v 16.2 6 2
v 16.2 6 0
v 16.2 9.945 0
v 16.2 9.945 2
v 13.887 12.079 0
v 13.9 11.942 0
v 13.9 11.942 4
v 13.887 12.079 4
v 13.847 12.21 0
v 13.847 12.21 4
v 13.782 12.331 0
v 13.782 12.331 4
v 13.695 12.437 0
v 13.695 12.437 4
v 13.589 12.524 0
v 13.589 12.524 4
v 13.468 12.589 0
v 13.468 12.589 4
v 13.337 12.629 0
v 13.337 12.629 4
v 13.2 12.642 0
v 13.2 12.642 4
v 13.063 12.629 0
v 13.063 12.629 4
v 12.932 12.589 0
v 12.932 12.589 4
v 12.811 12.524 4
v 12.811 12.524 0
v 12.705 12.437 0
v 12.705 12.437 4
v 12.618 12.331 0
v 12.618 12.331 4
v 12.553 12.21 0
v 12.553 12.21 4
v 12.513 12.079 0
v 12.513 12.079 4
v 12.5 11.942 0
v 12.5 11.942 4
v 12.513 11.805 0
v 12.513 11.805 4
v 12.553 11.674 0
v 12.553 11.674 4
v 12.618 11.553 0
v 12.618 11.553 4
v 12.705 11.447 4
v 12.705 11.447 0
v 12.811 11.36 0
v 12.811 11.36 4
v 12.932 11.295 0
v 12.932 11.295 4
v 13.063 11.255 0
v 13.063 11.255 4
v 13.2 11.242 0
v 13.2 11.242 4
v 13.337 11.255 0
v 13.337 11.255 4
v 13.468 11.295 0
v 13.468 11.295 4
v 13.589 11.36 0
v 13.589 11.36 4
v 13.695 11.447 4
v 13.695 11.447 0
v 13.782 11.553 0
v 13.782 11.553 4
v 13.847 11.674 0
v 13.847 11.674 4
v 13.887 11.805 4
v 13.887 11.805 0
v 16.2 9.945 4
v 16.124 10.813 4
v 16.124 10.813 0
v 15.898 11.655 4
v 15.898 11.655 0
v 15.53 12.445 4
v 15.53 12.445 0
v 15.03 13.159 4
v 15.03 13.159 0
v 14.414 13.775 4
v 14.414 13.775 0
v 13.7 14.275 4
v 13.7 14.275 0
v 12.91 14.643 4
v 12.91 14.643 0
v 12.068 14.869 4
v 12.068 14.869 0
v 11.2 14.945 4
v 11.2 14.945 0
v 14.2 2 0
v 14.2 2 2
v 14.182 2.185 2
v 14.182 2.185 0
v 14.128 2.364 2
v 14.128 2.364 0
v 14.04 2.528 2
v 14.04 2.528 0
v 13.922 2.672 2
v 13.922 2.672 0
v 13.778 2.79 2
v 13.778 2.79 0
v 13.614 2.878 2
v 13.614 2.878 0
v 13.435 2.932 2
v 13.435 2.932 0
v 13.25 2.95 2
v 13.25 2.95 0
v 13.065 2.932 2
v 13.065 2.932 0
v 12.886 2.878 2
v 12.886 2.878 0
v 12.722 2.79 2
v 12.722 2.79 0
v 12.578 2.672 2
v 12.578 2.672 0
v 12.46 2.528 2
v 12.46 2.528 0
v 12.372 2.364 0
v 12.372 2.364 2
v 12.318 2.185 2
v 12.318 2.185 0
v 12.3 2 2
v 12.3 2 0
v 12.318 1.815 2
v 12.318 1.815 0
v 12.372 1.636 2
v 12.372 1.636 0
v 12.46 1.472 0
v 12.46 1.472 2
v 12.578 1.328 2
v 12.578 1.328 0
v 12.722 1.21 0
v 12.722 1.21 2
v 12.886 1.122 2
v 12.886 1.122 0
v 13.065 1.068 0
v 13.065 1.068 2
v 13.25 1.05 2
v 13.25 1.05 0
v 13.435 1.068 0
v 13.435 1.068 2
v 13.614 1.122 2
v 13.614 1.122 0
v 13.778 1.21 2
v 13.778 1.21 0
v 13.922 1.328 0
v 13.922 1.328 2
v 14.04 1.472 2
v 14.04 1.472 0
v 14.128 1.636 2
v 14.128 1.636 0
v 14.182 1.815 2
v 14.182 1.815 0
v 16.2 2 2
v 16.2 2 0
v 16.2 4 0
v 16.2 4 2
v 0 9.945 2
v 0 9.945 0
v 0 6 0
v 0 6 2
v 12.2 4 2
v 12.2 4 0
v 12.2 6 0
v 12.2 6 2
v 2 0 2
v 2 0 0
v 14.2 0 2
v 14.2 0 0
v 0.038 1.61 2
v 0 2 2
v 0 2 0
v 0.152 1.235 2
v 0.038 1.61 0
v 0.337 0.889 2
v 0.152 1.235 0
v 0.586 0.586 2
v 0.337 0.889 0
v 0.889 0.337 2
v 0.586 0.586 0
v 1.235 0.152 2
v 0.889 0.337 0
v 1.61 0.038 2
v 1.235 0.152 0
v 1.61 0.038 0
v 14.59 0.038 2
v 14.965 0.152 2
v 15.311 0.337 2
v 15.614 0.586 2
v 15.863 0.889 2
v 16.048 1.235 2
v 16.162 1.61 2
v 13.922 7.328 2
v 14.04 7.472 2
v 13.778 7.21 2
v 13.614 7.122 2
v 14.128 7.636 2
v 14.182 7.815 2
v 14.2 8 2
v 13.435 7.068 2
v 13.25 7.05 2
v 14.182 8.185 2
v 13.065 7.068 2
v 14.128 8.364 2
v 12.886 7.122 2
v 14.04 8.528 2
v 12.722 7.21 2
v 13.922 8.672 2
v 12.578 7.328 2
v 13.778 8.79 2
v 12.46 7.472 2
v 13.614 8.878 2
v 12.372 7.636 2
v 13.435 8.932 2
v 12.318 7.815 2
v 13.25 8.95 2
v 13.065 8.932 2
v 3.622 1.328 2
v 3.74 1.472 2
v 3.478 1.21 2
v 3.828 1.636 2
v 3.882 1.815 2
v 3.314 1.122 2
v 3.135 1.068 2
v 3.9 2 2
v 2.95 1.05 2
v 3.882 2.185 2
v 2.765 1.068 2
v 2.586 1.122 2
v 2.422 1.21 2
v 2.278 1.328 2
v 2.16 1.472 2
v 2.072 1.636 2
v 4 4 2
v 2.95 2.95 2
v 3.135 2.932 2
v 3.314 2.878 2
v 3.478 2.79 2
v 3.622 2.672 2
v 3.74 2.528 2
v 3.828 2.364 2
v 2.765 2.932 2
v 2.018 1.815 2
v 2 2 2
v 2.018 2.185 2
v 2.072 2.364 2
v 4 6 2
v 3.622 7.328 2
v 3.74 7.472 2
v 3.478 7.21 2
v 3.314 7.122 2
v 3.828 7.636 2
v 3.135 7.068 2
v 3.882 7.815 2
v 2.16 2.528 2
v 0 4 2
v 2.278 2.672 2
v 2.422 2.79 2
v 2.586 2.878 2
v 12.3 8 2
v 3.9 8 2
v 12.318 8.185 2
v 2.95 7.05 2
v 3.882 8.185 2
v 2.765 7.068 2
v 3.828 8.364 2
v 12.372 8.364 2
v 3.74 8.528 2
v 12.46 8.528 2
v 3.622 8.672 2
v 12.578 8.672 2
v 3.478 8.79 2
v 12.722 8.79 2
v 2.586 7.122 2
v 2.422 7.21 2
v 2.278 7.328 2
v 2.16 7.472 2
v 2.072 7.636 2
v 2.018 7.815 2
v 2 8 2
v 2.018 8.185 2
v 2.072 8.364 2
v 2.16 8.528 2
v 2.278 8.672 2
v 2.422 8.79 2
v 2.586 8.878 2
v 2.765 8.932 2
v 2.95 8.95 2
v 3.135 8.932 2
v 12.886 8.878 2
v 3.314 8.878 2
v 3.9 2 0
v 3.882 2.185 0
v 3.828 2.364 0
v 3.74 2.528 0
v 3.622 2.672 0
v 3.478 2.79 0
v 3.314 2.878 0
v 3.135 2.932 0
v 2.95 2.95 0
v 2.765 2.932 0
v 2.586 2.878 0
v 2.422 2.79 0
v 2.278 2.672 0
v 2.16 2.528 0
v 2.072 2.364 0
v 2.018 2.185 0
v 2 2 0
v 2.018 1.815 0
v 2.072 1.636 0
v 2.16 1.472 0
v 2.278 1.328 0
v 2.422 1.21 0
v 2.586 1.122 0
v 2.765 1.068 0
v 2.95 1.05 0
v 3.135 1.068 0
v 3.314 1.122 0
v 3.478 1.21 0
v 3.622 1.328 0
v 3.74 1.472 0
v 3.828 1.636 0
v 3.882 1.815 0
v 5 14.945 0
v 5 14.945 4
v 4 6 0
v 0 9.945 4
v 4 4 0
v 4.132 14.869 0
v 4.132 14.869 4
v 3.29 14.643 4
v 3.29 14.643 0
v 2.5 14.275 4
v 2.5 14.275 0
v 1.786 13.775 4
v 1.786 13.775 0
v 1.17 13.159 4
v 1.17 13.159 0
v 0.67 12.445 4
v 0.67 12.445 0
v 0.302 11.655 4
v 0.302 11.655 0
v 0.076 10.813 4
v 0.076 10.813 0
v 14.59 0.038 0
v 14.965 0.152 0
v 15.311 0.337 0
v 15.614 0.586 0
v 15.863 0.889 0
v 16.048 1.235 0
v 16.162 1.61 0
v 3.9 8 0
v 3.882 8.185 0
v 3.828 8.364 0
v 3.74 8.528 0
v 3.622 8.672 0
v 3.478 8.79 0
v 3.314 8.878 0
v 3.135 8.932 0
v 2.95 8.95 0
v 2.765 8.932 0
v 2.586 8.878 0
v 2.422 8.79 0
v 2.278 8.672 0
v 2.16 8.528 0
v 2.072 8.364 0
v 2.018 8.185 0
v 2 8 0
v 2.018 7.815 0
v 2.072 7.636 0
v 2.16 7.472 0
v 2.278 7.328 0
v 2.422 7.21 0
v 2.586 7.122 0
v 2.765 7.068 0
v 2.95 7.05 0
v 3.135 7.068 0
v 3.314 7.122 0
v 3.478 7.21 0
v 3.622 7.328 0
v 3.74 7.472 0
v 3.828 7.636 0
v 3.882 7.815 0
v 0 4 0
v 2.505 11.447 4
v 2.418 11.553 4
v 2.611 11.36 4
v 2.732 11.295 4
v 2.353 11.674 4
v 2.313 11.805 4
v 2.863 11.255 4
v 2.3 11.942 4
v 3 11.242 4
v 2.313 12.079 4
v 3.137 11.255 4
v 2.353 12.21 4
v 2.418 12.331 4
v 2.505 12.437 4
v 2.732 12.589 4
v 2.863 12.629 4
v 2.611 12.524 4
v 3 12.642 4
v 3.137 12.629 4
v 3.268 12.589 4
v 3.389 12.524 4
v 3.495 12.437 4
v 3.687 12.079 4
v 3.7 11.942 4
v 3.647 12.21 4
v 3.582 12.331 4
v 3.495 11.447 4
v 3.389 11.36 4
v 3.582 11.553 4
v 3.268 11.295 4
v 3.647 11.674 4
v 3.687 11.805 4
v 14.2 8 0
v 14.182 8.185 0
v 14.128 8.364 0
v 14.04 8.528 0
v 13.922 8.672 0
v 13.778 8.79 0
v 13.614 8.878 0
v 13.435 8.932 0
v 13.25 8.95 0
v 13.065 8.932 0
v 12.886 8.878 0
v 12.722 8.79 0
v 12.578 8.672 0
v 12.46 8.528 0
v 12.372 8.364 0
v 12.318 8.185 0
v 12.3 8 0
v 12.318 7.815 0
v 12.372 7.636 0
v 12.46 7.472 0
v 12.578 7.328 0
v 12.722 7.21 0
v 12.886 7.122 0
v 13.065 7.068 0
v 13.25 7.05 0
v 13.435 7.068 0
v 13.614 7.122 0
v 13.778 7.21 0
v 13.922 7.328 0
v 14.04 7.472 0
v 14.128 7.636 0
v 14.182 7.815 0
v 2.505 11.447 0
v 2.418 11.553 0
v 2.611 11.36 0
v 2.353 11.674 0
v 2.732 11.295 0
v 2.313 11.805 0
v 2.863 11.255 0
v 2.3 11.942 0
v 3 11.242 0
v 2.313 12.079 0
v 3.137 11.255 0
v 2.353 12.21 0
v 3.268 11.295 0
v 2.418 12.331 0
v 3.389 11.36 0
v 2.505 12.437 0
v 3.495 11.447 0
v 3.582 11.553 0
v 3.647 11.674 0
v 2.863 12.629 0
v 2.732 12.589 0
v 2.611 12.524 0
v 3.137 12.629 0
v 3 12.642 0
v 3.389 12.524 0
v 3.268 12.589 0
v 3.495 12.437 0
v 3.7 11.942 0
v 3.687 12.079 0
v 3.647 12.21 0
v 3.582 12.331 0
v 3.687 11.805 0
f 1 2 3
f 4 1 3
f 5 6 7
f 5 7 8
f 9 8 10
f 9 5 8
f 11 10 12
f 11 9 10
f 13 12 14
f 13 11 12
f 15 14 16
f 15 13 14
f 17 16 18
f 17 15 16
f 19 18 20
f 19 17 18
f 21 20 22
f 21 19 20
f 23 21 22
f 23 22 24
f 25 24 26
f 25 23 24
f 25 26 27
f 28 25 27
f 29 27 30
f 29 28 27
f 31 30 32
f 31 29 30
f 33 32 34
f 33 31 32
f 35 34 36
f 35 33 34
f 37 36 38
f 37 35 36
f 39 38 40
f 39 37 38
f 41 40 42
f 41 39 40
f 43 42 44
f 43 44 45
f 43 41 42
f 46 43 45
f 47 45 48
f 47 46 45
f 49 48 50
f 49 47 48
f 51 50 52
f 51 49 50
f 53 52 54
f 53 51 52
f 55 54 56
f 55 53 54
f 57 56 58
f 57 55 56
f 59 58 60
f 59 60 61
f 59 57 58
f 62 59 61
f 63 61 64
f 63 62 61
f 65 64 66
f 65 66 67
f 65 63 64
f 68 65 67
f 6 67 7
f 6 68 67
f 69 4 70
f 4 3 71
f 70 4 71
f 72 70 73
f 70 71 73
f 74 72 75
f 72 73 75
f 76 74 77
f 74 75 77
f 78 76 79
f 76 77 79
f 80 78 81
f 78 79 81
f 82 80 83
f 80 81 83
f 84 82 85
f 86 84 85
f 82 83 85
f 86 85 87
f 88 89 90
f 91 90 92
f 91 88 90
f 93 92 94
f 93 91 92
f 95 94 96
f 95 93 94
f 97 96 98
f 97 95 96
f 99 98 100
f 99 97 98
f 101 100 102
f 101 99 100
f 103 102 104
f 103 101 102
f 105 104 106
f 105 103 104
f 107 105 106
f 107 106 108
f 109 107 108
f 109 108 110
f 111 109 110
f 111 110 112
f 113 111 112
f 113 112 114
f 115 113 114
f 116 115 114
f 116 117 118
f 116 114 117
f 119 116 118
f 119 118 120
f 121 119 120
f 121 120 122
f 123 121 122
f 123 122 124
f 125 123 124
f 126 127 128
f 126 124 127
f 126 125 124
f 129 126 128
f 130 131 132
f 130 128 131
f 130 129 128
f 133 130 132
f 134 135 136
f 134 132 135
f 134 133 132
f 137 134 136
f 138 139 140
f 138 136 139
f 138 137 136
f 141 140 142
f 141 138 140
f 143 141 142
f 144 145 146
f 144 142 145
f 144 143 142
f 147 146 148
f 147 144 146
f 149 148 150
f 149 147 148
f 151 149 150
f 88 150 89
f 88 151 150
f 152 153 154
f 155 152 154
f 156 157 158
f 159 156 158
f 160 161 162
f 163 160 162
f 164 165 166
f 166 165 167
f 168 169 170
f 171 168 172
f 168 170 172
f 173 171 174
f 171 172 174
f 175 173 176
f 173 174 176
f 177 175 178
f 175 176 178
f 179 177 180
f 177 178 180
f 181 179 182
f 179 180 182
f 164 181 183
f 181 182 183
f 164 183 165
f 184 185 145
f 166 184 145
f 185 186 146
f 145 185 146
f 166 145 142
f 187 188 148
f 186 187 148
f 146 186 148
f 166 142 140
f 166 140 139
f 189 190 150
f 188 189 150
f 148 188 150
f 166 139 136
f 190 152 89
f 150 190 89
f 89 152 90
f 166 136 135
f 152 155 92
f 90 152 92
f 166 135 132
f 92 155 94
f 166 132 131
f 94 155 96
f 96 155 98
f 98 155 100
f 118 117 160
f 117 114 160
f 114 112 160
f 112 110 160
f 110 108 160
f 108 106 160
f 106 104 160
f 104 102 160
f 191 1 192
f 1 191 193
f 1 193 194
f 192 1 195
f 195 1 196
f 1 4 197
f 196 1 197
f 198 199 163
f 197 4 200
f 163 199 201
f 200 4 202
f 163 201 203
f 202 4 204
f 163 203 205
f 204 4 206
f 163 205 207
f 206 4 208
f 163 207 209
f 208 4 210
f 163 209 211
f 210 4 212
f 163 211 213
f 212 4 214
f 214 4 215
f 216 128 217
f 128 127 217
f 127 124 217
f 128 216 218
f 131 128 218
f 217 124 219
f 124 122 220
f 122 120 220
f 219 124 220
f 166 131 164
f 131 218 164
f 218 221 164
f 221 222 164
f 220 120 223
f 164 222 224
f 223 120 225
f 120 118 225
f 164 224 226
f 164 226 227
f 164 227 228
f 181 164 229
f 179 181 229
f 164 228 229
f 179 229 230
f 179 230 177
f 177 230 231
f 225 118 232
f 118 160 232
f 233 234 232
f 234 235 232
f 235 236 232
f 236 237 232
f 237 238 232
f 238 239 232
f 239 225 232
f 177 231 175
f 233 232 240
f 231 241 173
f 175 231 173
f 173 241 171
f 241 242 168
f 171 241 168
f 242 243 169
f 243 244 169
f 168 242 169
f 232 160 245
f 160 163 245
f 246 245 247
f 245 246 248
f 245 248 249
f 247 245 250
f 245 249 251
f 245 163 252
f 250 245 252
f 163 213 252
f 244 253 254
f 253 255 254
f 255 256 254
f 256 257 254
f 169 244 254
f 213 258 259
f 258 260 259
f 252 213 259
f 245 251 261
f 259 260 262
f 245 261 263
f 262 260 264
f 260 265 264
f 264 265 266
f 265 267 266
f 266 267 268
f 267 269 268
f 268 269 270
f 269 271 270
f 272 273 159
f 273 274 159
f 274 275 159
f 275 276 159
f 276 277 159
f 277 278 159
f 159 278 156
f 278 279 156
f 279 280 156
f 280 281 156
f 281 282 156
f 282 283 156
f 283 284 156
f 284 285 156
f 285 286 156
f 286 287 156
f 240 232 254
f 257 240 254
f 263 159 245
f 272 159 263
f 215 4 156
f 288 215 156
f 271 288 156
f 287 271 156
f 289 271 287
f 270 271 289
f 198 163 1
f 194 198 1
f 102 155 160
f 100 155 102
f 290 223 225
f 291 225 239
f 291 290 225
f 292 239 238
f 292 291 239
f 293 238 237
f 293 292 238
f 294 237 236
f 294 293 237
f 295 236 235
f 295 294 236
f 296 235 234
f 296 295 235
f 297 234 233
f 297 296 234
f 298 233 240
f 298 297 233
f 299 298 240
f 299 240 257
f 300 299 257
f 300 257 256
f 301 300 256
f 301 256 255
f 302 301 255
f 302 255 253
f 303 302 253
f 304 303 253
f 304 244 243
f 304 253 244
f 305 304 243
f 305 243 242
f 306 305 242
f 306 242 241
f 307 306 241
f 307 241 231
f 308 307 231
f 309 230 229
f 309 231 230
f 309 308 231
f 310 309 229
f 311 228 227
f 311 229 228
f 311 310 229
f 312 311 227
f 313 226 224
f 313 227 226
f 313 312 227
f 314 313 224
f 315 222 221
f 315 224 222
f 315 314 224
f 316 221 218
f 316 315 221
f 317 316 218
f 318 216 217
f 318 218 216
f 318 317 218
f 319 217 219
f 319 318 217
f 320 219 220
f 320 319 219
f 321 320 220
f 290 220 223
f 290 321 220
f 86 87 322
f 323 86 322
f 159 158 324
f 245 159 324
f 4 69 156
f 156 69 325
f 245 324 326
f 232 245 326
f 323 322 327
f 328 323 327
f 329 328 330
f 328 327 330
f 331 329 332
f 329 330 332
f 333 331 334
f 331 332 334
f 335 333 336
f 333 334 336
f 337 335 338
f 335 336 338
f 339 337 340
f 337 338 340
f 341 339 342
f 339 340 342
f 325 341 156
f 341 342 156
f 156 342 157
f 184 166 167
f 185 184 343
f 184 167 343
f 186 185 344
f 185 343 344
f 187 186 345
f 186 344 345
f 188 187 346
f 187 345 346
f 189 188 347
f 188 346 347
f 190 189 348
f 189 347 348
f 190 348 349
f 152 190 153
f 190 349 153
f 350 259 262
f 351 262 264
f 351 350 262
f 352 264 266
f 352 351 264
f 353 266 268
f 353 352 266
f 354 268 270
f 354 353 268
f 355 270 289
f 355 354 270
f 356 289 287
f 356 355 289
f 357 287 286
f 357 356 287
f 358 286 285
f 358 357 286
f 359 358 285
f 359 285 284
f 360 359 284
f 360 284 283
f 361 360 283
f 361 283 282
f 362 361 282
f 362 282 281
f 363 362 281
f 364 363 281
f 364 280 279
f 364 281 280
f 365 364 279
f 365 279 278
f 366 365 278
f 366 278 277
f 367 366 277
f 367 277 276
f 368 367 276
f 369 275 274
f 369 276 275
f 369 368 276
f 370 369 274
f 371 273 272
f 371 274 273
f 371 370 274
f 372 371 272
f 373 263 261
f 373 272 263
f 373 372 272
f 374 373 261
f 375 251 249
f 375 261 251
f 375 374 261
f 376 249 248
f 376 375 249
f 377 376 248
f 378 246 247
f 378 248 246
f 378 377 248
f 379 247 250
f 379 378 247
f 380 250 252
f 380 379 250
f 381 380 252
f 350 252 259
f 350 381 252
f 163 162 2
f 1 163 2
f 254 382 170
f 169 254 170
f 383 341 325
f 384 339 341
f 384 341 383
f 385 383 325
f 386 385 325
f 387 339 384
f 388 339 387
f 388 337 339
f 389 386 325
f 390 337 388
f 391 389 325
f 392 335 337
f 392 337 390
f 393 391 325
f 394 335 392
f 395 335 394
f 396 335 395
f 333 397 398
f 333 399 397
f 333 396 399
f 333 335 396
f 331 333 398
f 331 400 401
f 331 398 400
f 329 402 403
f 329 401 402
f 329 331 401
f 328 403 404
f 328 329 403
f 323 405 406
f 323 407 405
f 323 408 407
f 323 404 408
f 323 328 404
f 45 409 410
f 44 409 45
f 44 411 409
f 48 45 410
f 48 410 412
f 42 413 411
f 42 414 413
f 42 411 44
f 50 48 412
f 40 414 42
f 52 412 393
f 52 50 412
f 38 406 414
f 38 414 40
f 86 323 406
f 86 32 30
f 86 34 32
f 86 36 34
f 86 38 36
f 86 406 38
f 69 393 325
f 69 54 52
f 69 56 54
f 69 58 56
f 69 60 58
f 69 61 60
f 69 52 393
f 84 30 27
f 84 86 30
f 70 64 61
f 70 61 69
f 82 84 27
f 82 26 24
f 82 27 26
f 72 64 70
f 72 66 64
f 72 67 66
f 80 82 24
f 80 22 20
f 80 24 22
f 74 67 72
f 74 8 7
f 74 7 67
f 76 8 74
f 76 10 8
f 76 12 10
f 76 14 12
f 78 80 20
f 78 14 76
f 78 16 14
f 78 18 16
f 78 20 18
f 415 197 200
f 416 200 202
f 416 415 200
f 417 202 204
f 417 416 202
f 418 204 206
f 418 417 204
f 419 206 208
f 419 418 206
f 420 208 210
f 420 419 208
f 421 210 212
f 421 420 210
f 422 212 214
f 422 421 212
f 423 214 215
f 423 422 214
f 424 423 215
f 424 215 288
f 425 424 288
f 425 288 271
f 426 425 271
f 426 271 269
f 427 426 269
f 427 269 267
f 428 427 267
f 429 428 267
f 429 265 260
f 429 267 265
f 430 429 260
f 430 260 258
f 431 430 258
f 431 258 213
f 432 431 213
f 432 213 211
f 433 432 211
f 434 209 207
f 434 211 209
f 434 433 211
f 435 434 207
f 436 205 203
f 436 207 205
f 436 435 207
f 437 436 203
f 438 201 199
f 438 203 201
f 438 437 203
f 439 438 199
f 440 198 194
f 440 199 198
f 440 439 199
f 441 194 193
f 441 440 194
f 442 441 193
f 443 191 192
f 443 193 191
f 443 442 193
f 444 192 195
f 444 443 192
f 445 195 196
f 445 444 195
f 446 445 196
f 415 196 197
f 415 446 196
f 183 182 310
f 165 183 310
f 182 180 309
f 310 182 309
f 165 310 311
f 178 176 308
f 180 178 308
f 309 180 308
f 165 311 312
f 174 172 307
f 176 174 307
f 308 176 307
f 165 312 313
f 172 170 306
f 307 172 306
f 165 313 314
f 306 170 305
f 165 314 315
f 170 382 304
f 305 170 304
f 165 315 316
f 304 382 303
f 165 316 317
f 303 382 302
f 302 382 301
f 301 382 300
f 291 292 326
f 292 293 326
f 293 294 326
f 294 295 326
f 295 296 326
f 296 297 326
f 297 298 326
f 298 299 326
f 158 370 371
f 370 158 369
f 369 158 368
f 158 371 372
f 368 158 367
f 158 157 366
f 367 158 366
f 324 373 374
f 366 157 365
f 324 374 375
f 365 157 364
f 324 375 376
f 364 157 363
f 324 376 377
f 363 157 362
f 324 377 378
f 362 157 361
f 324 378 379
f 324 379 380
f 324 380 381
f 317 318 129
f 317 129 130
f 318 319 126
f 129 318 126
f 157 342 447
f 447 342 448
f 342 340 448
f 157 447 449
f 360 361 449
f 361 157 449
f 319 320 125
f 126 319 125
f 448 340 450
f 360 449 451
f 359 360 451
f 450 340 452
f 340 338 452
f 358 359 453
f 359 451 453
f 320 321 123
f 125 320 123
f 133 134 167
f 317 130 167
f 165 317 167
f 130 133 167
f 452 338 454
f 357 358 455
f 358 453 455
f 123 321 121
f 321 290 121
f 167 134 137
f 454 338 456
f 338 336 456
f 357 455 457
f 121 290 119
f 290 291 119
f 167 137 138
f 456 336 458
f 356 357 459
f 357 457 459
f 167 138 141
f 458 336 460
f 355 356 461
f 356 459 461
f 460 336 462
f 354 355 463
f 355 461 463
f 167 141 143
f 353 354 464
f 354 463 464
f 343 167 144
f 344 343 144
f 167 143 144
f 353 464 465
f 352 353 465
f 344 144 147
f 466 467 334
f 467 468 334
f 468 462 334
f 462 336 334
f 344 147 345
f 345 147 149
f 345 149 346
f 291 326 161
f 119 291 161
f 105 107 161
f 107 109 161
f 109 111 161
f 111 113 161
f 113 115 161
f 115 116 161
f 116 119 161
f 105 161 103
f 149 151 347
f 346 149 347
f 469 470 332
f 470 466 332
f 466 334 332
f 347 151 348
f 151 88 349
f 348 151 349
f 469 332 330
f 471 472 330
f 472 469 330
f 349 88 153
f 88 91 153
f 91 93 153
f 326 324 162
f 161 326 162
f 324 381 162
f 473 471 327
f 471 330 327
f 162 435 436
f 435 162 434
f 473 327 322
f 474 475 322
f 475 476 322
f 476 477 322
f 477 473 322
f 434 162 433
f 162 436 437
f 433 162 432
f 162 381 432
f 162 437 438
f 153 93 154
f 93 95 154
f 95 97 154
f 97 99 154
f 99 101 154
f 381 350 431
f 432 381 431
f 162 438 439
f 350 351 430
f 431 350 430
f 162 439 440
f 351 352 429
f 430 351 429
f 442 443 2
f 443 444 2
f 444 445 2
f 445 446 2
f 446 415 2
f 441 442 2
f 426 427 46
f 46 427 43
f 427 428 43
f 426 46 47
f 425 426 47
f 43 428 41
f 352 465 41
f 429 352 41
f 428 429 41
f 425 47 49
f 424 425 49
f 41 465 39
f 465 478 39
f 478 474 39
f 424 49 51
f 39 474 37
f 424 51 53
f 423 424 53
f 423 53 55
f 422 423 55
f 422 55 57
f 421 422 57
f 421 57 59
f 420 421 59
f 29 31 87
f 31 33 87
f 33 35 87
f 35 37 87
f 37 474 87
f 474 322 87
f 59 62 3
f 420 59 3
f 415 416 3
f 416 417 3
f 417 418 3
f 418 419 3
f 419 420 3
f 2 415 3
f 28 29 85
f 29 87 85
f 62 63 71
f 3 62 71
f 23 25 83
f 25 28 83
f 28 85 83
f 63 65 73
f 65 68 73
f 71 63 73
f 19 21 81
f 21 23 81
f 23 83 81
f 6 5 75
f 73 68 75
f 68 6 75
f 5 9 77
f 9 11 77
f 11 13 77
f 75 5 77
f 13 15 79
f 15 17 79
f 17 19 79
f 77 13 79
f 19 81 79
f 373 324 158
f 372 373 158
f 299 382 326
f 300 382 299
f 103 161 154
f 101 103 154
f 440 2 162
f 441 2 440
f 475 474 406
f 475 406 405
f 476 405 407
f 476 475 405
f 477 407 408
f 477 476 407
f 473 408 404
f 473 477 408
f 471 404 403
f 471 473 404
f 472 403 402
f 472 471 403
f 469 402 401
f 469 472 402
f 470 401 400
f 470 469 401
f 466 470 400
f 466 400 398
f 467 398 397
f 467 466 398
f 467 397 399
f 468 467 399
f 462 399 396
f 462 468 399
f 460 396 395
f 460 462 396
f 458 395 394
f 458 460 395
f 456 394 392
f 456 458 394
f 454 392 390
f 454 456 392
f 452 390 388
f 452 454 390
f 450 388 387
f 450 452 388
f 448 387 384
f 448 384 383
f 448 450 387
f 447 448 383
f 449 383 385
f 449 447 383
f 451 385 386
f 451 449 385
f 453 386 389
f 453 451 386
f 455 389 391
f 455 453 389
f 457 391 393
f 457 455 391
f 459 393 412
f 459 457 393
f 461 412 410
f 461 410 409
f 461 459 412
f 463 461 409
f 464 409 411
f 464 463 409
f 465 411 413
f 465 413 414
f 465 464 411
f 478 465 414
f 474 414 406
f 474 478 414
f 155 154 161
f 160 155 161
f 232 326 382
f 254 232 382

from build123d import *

# Parameters (mm, degrees)
SKETCH2_R           = 0.95
SKETCH2_R_2         = 0.7
BOSS_EXTRUDE1_DEPTH = 4
SKETCH3_W           = 16.2
SKETCH3_H           = 9.945
CUT_EXTRUDE2_DEPTH  = 2


with BuildPart() as part:
    # Sketch2 → Boss-Extrude1 (new body)
    with BuildSketch(Plane.XY):
        with BuildLine():
            Line((0, 9.945), (0, 6))
            Line((0, 6), (4, 6))
            Line((4, 6), (4, 4))
            Line((4, 4), (0, 4))
            Line((0, 4), (0, 2))
            ThreePointArc((0, 2), (0.585786438, 0.585786438), (2, 0))
            Line((2, 0), (14.2, 0))
            ThreePointArc((14.2, 0), (15.614213562, 0.585786438), (16.2, 2))
            Line((16.2, 2), (16.2, 4))
            Line((16.2, 4), (12.2, 4))
            Line((12.2, 4), (12.2, 6))
            Line((12.2, 6), (16.2, 6))
            Line((16.2, 6), (16.2, 9.945))
            ThreePointArc((16.2, 9.945), (14.735533906, 13.480533906), (11.2, 14.945))
            Line((11.2, 14.945), (5, 14.945))
            ThreePointArc((5, 14.945), (1.464466094, 13.480533906), (0, 9.945))
        make_face()
        with Locations((13.25, 8)):
            Circle(SKETCH2_R, mode=Mode.SUBTRACT)
        with Locations((13.25, 2)):
            Circle(SKETCH2_R, mode=Mode.SUBTRACT)
        with Locations((13.2, 11.942)):
            Circle(SKETCH2_R_2, mode=Mode.SUBTRACT)
        with Locations((3, 11.942)):
            Circle(SKETCH2_R_2, mode=Mode.SUBTRACT)
        with Locations((2.95, 2)):
            Circle(SKETCH2_R, mode=Mode.SUBTRACT)
        with Locations((2.95, 8)):
            Circle(SKETCH2_R, mode=Mode.SUBTRACT)
    extrude(amount=BOSS_EXTRUDE1_DEPTH)

    # Sketch3 → Cut-Extrude2 (cut)
    with BuildSketch(Plane(origin=(0, 0, 4), x_dir=(-1, 0, 0), z_dir=(0, 0, -1))):
        with Locations((-8.1, 4.9725)):
            Rectangle(SKETCH3_W, SKETCH3_H)
    extrude(amount=CUT_EXTRUDE2_DEPTH, mode=Mode.SUBTRACT)


solid = part.part
